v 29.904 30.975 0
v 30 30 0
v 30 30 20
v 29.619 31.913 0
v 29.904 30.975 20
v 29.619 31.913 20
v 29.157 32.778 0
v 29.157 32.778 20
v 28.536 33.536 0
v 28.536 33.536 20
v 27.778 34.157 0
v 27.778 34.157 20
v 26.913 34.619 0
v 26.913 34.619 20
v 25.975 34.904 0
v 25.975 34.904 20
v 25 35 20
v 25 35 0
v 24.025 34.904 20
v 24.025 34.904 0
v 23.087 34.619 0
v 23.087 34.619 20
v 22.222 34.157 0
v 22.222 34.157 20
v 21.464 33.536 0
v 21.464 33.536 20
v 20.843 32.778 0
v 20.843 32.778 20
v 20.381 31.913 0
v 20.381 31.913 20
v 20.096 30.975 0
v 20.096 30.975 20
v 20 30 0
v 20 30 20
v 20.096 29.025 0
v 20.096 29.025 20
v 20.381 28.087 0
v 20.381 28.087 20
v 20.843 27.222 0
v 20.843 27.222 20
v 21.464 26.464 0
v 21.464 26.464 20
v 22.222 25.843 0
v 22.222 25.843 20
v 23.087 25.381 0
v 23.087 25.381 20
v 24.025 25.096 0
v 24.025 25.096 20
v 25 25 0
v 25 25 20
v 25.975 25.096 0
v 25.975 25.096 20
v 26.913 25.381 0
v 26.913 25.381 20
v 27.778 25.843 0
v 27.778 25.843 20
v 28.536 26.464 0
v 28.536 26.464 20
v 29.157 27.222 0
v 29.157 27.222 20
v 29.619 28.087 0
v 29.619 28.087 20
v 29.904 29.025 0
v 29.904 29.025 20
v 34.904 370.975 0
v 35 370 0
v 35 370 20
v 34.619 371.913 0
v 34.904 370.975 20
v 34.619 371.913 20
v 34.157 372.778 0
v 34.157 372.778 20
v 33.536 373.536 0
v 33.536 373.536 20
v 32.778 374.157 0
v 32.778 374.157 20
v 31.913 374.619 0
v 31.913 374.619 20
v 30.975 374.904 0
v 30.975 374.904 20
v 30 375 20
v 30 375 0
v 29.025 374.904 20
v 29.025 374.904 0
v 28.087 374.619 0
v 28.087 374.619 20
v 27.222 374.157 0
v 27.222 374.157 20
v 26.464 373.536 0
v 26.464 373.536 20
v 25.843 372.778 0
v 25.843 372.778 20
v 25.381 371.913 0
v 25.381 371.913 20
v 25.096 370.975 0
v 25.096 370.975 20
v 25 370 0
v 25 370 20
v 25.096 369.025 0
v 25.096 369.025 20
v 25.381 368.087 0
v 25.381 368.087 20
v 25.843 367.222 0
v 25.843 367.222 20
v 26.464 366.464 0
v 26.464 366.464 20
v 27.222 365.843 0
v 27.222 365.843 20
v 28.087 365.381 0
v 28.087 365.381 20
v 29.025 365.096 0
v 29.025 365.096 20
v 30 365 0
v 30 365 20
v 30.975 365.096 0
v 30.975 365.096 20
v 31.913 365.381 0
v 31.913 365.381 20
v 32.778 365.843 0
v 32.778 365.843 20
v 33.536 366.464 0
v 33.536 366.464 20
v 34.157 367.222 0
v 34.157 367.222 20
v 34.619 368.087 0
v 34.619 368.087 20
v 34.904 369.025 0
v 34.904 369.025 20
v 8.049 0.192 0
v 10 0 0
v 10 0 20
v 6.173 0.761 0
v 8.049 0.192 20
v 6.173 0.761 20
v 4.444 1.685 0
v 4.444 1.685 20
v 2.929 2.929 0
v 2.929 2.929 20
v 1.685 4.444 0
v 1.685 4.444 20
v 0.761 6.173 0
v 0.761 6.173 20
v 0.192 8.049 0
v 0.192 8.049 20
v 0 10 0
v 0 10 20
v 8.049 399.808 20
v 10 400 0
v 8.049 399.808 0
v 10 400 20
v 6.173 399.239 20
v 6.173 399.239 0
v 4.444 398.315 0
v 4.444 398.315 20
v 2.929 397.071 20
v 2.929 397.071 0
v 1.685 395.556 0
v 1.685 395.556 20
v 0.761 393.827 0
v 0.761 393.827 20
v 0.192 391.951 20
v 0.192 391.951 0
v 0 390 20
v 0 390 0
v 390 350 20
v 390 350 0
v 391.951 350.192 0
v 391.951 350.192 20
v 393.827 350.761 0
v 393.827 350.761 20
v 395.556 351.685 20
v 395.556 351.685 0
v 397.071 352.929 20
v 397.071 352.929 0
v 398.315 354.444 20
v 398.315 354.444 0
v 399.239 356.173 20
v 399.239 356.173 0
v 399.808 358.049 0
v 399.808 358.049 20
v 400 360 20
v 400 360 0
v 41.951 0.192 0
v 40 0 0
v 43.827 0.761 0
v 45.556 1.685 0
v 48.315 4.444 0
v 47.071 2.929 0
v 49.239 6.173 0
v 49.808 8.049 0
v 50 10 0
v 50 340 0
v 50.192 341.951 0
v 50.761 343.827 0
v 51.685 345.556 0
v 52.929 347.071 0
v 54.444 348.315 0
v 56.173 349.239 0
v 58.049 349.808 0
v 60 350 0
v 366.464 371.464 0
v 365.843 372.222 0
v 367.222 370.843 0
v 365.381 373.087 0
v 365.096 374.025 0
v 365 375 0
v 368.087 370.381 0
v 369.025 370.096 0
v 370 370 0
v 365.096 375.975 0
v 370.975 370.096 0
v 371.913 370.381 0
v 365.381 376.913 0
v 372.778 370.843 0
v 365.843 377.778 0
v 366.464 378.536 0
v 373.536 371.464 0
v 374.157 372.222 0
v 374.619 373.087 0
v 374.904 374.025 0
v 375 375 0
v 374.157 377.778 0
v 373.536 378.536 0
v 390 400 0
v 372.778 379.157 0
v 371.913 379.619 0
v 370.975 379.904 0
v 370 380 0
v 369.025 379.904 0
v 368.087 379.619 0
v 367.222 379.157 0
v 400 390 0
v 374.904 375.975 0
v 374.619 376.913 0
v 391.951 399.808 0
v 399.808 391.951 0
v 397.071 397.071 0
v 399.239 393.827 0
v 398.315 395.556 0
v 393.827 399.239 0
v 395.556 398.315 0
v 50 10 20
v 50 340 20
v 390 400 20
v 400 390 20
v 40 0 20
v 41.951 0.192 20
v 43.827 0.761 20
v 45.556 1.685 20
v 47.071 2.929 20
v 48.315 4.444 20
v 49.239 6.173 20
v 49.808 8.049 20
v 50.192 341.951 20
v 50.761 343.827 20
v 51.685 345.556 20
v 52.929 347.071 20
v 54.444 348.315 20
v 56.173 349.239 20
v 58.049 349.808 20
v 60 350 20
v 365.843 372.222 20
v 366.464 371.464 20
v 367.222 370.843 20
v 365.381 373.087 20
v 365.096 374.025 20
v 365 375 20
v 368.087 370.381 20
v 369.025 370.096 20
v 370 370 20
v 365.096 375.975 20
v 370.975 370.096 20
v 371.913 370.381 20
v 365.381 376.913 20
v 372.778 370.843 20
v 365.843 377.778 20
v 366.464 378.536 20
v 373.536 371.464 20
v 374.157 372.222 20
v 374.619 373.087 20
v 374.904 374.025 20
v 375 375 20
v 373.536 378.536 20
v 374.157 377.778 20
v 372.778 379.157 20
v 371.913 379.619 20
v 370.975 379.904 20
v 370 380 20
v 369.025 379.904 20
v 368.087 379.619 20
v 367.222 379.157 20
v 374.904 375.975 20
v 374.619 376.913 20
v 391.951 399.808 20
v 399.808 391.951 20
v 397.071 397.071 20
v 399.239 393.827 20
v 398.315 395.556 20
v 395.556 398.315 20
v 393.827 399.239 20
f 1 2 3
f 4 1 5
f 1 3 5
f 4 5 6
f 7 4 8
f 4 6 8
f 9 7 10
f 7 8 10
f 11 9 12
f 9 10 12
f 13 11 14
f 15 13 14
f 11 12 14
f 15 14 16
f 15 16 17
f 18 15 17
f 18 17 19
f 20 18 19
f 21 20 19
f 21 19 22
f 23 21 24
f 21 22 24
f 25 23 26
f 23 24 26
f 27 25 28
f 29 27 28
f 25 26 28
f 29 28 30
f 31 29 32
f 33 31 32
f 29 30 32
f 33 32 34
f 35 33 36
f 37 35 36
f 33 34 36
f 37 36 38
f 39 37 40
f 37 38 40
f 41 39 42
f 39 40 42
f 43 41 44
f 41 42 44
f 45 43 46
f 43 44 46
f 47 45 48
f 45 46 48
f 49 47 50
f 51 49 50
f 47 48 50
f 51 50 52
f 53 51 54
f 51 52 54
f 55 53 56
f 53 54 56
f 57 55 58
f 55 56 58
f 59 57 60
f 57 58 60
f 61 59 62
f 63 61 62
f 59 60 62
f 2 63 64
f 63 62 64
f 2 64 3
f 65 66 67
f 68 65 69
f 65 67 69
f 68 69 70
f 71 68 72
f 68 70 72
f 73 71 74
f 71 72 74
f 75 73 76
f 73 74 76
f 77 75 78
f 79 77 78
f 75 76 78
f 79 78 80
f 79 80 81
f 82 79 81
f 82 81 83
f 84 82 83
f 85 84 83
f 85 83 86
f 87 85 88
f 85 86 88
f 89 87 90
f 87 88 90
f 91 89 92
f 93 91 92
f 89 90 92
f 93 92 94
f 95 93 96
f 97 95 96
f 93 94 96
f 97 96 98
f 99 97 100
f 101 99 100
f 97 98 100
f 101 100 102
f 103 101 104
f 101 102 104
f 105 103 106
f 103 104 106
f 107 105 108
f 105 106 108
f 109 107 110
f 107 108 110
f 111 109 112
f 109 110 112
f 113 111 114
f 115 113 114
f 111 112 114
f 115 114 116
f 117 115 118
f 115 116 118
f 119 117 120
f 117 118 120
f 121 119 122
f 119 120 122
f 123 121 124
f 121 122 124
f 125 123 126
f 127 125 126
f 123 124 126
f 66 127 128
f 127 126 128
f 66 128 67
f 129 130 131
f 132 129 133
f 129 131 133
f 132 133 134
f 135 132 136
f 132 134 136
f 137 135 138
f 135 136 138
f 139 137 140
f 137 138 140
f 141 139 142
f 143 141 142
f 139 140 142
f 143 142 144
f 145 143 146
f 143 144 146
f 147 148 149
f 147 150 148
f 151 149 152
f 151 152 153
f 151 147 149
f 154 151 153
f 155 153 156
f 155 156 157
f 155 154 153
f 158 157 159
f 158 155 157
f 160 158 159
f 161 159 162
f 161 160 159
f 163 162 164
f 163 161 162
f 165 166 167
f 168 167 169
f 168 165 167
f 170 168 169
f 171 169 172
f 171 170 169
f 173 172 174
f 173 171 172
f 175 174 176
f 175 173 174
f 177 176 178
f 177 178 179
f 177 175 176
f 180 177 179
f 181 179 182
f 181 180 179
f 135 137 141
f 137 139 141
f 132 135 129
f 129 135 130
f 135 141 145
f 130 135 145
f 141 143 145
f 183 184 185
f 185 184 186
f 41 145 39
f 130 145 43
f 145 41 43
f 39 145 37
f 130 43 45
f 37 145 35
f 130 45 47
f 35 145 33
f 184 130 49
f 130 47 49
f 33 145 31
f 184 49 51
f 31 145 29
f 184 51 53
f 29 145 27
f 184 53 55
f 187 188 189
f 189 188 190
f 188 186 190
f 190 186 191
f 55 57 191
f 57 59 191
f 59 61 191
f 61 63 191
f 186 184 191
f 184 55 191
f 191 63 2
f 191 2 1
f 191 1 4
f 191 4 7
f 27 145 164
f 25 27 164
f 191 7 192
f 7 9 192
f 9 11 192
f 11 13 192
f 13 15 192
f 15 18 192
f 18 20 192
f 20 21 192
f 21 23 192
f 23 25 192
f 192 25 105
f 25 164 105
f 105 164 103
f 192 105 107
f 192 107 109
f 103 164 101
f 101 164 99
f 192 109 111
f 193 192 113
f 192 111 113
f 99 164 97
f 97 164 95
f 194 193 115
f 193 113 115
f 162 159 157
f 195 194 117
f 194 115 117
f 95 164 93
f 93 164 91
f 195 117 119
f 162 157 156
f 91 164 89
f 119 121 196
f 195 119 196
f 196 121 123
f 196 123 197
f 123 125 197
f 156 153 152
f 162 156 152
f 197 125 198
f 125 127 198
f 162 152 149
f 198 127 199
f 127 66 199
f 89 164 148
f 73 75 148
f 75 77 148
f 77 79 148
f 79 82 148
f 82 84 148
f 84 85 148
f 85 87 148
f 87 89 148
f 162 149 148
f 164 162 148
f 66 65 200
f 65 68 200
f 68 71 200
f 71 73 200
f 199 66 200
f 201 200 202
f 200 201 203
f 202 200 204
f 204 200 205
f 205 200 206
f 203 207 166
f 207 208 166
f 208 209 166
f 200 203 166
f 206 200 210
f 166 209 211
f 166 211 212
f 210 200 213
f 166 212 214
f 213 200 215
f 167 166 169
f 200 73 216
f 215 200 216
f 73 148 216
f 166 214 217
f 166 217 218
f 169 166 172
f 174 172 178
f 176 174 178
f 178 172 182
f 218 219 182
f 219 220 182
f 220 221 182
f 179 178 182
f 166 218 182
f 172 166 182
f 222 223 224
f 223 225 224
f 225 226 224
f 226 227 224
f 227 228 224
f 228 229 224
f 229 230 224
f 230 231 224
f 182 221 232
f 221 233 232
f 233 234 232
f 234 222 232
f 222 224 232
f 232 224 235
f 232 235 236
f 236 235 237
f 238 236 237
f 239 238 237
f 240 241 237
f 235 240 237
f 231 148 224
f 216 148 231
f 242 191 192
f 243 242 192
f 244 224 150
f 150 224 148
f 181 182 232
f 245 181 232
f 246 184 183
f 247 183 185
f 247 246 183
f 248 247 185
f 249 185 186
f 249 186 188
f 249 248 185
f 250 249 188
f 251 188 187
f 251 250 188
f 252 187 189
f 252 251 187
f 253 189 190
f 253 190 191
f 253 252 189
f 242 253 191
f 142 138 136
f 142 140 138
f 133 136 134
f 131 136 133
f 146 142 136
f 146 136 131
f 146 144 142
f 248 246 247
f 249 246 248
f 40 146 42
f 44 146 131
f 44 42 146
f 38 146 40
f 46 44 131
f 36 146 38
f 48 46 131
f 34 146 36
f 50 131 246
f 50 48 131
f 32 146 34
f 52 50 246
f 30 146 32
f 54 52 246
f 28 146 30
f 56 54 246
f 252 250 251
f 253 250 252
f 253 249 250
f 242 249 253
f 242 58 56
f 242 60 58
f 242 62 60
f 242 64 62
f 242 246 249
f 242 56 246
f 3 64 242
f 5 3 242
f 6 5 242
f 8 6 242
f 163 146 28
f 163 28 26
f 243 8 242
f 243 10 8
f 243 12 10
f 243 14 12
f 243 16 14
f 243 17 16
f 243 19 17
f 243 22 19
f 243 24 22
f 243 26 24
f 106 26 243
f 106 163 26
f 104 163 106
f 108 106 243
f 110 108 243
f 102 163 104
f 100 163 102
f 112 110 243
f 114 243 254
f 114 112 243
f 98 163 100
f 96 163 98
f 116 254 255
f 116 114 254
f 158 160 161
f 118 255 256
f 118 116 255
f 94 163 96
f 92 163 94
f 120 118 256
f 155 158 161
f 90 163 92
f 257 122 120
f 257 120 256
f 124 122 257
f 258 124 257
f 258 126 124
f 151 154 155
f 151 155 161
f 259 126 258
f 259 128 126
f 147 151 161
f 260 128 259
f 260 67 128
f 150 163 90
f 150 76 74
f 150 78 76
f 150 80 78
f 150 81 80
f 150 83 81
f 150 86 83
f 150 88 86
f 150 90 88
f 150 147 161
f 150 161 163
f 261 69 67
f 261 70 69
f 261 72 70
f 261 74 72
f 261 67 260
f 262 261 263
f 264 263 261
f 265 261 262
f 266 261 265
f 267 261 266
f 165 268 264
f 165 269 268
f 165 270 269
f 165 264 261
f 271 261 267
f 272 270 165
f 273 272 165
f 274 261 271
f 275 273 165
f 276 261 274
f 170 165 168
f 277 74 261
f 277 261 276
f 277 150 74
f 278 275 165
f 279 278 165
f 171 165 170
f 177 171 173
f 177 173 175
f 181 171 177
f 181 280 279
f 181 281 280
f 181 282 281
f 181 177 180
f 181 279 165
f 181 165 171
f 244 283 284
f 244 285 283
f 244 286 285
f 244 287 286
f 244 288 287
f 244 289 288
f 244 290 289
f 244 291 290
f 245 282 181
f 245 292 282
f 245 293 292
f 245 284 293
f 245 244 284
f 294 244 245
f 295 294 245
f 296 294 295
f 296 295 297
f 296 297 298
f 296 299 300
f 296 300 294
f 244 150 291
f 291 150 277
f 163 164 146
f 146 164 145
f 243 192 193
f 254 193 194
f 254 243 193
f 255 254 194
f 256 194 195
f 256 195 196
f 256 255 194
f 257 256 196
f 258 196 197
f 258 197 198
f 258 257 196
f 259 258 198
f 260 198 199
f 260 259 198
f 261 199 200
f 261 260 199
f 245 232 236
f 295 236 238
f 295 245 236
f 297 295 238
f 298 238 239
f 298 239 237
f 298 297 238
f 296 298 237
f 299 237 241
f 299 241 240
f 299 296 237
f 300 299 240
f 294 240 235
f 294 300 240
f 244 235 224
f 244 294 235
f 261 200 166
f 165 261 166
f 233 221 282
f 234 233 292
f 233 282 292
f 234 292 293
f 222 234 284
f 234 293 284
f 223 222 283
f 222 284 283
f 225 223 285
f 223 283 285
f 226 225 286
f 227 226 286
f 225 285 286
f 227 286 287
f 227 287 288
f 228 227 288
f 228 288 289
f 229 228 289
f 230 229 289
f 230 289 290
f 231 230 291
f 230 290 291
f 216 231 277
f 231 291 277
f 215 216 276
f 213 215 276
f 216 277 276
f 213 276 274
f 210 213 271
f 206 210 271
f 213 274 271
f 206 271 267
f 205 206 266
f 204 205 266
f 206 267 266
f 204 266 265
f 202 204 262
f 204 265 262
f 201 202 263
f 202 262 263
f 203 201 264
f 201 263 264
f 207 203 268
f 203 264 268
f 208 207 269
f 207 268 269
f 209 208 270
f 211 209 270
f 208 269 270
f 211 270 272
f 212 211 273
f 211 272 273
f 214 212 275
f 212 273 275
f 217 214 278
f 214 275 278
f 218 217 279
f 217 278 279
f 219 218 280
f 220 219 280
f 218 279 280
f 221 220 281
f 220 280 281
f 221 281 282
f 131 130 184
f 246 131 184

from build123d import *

# Parameters (mm, degrees)
SKETCH1_W           = 50
SKETCH1_H           = 350
SKETCH1_H_2         = 50
SKETCH1_W_2         = 350
BOSS_EXTRUDE1_DEPTH = 20
FILLET1_R           = 10
SKETCH2_R           = 5
CUT_EXTRUDE1_DEPTH  = 20


with BuildPart() as part:
    # Sketch1 → Boss-Extrude1 (new body)
    with BuildSketch(Plane.XY):
        with Locations((25, 175)):
            Rectangle(SKETCH1_W, SKETCH1_H)
        with Locations((25, 375)):
            Rectangle(SKETCH1_W, SKETCH1_H_2)
        with Locations((225, 375)):
            Rectangle(SKETCH1_W_2, SKETCH1_H_2)
    extrude(amount=BOSS_EXTRUDE1_DEPTH)

    # Fillet1
    fillet1_edges = [part.edges().sort_by_distance(p)[0] for p in [
        (50, 0, 10),
        (0, 0, 10),
        (0, 400, 10),
        (400, 400, 10),
        (400, 350, 10),
        (50, 350, 10),
    ]]
    fillet(fillet1_edges, radius=FILLET1_R)

    # Sketch2 → Cut-Extrude1 (cut)
    with BuildSketch(Plane.XY.offset(20)):
        with Locations((25, 30)):
            Circle(SKETCH2_R)
        with Locations((30, 370)):
            Circle(SKETCH2_R)
        with Locations((370, 375)):
            Circle(SKETCH2_R)
    extrude(amount=-CUT_EXTRUDE1_DEPTH, mode=Mode.SUBTRACT)


solid = part.part
